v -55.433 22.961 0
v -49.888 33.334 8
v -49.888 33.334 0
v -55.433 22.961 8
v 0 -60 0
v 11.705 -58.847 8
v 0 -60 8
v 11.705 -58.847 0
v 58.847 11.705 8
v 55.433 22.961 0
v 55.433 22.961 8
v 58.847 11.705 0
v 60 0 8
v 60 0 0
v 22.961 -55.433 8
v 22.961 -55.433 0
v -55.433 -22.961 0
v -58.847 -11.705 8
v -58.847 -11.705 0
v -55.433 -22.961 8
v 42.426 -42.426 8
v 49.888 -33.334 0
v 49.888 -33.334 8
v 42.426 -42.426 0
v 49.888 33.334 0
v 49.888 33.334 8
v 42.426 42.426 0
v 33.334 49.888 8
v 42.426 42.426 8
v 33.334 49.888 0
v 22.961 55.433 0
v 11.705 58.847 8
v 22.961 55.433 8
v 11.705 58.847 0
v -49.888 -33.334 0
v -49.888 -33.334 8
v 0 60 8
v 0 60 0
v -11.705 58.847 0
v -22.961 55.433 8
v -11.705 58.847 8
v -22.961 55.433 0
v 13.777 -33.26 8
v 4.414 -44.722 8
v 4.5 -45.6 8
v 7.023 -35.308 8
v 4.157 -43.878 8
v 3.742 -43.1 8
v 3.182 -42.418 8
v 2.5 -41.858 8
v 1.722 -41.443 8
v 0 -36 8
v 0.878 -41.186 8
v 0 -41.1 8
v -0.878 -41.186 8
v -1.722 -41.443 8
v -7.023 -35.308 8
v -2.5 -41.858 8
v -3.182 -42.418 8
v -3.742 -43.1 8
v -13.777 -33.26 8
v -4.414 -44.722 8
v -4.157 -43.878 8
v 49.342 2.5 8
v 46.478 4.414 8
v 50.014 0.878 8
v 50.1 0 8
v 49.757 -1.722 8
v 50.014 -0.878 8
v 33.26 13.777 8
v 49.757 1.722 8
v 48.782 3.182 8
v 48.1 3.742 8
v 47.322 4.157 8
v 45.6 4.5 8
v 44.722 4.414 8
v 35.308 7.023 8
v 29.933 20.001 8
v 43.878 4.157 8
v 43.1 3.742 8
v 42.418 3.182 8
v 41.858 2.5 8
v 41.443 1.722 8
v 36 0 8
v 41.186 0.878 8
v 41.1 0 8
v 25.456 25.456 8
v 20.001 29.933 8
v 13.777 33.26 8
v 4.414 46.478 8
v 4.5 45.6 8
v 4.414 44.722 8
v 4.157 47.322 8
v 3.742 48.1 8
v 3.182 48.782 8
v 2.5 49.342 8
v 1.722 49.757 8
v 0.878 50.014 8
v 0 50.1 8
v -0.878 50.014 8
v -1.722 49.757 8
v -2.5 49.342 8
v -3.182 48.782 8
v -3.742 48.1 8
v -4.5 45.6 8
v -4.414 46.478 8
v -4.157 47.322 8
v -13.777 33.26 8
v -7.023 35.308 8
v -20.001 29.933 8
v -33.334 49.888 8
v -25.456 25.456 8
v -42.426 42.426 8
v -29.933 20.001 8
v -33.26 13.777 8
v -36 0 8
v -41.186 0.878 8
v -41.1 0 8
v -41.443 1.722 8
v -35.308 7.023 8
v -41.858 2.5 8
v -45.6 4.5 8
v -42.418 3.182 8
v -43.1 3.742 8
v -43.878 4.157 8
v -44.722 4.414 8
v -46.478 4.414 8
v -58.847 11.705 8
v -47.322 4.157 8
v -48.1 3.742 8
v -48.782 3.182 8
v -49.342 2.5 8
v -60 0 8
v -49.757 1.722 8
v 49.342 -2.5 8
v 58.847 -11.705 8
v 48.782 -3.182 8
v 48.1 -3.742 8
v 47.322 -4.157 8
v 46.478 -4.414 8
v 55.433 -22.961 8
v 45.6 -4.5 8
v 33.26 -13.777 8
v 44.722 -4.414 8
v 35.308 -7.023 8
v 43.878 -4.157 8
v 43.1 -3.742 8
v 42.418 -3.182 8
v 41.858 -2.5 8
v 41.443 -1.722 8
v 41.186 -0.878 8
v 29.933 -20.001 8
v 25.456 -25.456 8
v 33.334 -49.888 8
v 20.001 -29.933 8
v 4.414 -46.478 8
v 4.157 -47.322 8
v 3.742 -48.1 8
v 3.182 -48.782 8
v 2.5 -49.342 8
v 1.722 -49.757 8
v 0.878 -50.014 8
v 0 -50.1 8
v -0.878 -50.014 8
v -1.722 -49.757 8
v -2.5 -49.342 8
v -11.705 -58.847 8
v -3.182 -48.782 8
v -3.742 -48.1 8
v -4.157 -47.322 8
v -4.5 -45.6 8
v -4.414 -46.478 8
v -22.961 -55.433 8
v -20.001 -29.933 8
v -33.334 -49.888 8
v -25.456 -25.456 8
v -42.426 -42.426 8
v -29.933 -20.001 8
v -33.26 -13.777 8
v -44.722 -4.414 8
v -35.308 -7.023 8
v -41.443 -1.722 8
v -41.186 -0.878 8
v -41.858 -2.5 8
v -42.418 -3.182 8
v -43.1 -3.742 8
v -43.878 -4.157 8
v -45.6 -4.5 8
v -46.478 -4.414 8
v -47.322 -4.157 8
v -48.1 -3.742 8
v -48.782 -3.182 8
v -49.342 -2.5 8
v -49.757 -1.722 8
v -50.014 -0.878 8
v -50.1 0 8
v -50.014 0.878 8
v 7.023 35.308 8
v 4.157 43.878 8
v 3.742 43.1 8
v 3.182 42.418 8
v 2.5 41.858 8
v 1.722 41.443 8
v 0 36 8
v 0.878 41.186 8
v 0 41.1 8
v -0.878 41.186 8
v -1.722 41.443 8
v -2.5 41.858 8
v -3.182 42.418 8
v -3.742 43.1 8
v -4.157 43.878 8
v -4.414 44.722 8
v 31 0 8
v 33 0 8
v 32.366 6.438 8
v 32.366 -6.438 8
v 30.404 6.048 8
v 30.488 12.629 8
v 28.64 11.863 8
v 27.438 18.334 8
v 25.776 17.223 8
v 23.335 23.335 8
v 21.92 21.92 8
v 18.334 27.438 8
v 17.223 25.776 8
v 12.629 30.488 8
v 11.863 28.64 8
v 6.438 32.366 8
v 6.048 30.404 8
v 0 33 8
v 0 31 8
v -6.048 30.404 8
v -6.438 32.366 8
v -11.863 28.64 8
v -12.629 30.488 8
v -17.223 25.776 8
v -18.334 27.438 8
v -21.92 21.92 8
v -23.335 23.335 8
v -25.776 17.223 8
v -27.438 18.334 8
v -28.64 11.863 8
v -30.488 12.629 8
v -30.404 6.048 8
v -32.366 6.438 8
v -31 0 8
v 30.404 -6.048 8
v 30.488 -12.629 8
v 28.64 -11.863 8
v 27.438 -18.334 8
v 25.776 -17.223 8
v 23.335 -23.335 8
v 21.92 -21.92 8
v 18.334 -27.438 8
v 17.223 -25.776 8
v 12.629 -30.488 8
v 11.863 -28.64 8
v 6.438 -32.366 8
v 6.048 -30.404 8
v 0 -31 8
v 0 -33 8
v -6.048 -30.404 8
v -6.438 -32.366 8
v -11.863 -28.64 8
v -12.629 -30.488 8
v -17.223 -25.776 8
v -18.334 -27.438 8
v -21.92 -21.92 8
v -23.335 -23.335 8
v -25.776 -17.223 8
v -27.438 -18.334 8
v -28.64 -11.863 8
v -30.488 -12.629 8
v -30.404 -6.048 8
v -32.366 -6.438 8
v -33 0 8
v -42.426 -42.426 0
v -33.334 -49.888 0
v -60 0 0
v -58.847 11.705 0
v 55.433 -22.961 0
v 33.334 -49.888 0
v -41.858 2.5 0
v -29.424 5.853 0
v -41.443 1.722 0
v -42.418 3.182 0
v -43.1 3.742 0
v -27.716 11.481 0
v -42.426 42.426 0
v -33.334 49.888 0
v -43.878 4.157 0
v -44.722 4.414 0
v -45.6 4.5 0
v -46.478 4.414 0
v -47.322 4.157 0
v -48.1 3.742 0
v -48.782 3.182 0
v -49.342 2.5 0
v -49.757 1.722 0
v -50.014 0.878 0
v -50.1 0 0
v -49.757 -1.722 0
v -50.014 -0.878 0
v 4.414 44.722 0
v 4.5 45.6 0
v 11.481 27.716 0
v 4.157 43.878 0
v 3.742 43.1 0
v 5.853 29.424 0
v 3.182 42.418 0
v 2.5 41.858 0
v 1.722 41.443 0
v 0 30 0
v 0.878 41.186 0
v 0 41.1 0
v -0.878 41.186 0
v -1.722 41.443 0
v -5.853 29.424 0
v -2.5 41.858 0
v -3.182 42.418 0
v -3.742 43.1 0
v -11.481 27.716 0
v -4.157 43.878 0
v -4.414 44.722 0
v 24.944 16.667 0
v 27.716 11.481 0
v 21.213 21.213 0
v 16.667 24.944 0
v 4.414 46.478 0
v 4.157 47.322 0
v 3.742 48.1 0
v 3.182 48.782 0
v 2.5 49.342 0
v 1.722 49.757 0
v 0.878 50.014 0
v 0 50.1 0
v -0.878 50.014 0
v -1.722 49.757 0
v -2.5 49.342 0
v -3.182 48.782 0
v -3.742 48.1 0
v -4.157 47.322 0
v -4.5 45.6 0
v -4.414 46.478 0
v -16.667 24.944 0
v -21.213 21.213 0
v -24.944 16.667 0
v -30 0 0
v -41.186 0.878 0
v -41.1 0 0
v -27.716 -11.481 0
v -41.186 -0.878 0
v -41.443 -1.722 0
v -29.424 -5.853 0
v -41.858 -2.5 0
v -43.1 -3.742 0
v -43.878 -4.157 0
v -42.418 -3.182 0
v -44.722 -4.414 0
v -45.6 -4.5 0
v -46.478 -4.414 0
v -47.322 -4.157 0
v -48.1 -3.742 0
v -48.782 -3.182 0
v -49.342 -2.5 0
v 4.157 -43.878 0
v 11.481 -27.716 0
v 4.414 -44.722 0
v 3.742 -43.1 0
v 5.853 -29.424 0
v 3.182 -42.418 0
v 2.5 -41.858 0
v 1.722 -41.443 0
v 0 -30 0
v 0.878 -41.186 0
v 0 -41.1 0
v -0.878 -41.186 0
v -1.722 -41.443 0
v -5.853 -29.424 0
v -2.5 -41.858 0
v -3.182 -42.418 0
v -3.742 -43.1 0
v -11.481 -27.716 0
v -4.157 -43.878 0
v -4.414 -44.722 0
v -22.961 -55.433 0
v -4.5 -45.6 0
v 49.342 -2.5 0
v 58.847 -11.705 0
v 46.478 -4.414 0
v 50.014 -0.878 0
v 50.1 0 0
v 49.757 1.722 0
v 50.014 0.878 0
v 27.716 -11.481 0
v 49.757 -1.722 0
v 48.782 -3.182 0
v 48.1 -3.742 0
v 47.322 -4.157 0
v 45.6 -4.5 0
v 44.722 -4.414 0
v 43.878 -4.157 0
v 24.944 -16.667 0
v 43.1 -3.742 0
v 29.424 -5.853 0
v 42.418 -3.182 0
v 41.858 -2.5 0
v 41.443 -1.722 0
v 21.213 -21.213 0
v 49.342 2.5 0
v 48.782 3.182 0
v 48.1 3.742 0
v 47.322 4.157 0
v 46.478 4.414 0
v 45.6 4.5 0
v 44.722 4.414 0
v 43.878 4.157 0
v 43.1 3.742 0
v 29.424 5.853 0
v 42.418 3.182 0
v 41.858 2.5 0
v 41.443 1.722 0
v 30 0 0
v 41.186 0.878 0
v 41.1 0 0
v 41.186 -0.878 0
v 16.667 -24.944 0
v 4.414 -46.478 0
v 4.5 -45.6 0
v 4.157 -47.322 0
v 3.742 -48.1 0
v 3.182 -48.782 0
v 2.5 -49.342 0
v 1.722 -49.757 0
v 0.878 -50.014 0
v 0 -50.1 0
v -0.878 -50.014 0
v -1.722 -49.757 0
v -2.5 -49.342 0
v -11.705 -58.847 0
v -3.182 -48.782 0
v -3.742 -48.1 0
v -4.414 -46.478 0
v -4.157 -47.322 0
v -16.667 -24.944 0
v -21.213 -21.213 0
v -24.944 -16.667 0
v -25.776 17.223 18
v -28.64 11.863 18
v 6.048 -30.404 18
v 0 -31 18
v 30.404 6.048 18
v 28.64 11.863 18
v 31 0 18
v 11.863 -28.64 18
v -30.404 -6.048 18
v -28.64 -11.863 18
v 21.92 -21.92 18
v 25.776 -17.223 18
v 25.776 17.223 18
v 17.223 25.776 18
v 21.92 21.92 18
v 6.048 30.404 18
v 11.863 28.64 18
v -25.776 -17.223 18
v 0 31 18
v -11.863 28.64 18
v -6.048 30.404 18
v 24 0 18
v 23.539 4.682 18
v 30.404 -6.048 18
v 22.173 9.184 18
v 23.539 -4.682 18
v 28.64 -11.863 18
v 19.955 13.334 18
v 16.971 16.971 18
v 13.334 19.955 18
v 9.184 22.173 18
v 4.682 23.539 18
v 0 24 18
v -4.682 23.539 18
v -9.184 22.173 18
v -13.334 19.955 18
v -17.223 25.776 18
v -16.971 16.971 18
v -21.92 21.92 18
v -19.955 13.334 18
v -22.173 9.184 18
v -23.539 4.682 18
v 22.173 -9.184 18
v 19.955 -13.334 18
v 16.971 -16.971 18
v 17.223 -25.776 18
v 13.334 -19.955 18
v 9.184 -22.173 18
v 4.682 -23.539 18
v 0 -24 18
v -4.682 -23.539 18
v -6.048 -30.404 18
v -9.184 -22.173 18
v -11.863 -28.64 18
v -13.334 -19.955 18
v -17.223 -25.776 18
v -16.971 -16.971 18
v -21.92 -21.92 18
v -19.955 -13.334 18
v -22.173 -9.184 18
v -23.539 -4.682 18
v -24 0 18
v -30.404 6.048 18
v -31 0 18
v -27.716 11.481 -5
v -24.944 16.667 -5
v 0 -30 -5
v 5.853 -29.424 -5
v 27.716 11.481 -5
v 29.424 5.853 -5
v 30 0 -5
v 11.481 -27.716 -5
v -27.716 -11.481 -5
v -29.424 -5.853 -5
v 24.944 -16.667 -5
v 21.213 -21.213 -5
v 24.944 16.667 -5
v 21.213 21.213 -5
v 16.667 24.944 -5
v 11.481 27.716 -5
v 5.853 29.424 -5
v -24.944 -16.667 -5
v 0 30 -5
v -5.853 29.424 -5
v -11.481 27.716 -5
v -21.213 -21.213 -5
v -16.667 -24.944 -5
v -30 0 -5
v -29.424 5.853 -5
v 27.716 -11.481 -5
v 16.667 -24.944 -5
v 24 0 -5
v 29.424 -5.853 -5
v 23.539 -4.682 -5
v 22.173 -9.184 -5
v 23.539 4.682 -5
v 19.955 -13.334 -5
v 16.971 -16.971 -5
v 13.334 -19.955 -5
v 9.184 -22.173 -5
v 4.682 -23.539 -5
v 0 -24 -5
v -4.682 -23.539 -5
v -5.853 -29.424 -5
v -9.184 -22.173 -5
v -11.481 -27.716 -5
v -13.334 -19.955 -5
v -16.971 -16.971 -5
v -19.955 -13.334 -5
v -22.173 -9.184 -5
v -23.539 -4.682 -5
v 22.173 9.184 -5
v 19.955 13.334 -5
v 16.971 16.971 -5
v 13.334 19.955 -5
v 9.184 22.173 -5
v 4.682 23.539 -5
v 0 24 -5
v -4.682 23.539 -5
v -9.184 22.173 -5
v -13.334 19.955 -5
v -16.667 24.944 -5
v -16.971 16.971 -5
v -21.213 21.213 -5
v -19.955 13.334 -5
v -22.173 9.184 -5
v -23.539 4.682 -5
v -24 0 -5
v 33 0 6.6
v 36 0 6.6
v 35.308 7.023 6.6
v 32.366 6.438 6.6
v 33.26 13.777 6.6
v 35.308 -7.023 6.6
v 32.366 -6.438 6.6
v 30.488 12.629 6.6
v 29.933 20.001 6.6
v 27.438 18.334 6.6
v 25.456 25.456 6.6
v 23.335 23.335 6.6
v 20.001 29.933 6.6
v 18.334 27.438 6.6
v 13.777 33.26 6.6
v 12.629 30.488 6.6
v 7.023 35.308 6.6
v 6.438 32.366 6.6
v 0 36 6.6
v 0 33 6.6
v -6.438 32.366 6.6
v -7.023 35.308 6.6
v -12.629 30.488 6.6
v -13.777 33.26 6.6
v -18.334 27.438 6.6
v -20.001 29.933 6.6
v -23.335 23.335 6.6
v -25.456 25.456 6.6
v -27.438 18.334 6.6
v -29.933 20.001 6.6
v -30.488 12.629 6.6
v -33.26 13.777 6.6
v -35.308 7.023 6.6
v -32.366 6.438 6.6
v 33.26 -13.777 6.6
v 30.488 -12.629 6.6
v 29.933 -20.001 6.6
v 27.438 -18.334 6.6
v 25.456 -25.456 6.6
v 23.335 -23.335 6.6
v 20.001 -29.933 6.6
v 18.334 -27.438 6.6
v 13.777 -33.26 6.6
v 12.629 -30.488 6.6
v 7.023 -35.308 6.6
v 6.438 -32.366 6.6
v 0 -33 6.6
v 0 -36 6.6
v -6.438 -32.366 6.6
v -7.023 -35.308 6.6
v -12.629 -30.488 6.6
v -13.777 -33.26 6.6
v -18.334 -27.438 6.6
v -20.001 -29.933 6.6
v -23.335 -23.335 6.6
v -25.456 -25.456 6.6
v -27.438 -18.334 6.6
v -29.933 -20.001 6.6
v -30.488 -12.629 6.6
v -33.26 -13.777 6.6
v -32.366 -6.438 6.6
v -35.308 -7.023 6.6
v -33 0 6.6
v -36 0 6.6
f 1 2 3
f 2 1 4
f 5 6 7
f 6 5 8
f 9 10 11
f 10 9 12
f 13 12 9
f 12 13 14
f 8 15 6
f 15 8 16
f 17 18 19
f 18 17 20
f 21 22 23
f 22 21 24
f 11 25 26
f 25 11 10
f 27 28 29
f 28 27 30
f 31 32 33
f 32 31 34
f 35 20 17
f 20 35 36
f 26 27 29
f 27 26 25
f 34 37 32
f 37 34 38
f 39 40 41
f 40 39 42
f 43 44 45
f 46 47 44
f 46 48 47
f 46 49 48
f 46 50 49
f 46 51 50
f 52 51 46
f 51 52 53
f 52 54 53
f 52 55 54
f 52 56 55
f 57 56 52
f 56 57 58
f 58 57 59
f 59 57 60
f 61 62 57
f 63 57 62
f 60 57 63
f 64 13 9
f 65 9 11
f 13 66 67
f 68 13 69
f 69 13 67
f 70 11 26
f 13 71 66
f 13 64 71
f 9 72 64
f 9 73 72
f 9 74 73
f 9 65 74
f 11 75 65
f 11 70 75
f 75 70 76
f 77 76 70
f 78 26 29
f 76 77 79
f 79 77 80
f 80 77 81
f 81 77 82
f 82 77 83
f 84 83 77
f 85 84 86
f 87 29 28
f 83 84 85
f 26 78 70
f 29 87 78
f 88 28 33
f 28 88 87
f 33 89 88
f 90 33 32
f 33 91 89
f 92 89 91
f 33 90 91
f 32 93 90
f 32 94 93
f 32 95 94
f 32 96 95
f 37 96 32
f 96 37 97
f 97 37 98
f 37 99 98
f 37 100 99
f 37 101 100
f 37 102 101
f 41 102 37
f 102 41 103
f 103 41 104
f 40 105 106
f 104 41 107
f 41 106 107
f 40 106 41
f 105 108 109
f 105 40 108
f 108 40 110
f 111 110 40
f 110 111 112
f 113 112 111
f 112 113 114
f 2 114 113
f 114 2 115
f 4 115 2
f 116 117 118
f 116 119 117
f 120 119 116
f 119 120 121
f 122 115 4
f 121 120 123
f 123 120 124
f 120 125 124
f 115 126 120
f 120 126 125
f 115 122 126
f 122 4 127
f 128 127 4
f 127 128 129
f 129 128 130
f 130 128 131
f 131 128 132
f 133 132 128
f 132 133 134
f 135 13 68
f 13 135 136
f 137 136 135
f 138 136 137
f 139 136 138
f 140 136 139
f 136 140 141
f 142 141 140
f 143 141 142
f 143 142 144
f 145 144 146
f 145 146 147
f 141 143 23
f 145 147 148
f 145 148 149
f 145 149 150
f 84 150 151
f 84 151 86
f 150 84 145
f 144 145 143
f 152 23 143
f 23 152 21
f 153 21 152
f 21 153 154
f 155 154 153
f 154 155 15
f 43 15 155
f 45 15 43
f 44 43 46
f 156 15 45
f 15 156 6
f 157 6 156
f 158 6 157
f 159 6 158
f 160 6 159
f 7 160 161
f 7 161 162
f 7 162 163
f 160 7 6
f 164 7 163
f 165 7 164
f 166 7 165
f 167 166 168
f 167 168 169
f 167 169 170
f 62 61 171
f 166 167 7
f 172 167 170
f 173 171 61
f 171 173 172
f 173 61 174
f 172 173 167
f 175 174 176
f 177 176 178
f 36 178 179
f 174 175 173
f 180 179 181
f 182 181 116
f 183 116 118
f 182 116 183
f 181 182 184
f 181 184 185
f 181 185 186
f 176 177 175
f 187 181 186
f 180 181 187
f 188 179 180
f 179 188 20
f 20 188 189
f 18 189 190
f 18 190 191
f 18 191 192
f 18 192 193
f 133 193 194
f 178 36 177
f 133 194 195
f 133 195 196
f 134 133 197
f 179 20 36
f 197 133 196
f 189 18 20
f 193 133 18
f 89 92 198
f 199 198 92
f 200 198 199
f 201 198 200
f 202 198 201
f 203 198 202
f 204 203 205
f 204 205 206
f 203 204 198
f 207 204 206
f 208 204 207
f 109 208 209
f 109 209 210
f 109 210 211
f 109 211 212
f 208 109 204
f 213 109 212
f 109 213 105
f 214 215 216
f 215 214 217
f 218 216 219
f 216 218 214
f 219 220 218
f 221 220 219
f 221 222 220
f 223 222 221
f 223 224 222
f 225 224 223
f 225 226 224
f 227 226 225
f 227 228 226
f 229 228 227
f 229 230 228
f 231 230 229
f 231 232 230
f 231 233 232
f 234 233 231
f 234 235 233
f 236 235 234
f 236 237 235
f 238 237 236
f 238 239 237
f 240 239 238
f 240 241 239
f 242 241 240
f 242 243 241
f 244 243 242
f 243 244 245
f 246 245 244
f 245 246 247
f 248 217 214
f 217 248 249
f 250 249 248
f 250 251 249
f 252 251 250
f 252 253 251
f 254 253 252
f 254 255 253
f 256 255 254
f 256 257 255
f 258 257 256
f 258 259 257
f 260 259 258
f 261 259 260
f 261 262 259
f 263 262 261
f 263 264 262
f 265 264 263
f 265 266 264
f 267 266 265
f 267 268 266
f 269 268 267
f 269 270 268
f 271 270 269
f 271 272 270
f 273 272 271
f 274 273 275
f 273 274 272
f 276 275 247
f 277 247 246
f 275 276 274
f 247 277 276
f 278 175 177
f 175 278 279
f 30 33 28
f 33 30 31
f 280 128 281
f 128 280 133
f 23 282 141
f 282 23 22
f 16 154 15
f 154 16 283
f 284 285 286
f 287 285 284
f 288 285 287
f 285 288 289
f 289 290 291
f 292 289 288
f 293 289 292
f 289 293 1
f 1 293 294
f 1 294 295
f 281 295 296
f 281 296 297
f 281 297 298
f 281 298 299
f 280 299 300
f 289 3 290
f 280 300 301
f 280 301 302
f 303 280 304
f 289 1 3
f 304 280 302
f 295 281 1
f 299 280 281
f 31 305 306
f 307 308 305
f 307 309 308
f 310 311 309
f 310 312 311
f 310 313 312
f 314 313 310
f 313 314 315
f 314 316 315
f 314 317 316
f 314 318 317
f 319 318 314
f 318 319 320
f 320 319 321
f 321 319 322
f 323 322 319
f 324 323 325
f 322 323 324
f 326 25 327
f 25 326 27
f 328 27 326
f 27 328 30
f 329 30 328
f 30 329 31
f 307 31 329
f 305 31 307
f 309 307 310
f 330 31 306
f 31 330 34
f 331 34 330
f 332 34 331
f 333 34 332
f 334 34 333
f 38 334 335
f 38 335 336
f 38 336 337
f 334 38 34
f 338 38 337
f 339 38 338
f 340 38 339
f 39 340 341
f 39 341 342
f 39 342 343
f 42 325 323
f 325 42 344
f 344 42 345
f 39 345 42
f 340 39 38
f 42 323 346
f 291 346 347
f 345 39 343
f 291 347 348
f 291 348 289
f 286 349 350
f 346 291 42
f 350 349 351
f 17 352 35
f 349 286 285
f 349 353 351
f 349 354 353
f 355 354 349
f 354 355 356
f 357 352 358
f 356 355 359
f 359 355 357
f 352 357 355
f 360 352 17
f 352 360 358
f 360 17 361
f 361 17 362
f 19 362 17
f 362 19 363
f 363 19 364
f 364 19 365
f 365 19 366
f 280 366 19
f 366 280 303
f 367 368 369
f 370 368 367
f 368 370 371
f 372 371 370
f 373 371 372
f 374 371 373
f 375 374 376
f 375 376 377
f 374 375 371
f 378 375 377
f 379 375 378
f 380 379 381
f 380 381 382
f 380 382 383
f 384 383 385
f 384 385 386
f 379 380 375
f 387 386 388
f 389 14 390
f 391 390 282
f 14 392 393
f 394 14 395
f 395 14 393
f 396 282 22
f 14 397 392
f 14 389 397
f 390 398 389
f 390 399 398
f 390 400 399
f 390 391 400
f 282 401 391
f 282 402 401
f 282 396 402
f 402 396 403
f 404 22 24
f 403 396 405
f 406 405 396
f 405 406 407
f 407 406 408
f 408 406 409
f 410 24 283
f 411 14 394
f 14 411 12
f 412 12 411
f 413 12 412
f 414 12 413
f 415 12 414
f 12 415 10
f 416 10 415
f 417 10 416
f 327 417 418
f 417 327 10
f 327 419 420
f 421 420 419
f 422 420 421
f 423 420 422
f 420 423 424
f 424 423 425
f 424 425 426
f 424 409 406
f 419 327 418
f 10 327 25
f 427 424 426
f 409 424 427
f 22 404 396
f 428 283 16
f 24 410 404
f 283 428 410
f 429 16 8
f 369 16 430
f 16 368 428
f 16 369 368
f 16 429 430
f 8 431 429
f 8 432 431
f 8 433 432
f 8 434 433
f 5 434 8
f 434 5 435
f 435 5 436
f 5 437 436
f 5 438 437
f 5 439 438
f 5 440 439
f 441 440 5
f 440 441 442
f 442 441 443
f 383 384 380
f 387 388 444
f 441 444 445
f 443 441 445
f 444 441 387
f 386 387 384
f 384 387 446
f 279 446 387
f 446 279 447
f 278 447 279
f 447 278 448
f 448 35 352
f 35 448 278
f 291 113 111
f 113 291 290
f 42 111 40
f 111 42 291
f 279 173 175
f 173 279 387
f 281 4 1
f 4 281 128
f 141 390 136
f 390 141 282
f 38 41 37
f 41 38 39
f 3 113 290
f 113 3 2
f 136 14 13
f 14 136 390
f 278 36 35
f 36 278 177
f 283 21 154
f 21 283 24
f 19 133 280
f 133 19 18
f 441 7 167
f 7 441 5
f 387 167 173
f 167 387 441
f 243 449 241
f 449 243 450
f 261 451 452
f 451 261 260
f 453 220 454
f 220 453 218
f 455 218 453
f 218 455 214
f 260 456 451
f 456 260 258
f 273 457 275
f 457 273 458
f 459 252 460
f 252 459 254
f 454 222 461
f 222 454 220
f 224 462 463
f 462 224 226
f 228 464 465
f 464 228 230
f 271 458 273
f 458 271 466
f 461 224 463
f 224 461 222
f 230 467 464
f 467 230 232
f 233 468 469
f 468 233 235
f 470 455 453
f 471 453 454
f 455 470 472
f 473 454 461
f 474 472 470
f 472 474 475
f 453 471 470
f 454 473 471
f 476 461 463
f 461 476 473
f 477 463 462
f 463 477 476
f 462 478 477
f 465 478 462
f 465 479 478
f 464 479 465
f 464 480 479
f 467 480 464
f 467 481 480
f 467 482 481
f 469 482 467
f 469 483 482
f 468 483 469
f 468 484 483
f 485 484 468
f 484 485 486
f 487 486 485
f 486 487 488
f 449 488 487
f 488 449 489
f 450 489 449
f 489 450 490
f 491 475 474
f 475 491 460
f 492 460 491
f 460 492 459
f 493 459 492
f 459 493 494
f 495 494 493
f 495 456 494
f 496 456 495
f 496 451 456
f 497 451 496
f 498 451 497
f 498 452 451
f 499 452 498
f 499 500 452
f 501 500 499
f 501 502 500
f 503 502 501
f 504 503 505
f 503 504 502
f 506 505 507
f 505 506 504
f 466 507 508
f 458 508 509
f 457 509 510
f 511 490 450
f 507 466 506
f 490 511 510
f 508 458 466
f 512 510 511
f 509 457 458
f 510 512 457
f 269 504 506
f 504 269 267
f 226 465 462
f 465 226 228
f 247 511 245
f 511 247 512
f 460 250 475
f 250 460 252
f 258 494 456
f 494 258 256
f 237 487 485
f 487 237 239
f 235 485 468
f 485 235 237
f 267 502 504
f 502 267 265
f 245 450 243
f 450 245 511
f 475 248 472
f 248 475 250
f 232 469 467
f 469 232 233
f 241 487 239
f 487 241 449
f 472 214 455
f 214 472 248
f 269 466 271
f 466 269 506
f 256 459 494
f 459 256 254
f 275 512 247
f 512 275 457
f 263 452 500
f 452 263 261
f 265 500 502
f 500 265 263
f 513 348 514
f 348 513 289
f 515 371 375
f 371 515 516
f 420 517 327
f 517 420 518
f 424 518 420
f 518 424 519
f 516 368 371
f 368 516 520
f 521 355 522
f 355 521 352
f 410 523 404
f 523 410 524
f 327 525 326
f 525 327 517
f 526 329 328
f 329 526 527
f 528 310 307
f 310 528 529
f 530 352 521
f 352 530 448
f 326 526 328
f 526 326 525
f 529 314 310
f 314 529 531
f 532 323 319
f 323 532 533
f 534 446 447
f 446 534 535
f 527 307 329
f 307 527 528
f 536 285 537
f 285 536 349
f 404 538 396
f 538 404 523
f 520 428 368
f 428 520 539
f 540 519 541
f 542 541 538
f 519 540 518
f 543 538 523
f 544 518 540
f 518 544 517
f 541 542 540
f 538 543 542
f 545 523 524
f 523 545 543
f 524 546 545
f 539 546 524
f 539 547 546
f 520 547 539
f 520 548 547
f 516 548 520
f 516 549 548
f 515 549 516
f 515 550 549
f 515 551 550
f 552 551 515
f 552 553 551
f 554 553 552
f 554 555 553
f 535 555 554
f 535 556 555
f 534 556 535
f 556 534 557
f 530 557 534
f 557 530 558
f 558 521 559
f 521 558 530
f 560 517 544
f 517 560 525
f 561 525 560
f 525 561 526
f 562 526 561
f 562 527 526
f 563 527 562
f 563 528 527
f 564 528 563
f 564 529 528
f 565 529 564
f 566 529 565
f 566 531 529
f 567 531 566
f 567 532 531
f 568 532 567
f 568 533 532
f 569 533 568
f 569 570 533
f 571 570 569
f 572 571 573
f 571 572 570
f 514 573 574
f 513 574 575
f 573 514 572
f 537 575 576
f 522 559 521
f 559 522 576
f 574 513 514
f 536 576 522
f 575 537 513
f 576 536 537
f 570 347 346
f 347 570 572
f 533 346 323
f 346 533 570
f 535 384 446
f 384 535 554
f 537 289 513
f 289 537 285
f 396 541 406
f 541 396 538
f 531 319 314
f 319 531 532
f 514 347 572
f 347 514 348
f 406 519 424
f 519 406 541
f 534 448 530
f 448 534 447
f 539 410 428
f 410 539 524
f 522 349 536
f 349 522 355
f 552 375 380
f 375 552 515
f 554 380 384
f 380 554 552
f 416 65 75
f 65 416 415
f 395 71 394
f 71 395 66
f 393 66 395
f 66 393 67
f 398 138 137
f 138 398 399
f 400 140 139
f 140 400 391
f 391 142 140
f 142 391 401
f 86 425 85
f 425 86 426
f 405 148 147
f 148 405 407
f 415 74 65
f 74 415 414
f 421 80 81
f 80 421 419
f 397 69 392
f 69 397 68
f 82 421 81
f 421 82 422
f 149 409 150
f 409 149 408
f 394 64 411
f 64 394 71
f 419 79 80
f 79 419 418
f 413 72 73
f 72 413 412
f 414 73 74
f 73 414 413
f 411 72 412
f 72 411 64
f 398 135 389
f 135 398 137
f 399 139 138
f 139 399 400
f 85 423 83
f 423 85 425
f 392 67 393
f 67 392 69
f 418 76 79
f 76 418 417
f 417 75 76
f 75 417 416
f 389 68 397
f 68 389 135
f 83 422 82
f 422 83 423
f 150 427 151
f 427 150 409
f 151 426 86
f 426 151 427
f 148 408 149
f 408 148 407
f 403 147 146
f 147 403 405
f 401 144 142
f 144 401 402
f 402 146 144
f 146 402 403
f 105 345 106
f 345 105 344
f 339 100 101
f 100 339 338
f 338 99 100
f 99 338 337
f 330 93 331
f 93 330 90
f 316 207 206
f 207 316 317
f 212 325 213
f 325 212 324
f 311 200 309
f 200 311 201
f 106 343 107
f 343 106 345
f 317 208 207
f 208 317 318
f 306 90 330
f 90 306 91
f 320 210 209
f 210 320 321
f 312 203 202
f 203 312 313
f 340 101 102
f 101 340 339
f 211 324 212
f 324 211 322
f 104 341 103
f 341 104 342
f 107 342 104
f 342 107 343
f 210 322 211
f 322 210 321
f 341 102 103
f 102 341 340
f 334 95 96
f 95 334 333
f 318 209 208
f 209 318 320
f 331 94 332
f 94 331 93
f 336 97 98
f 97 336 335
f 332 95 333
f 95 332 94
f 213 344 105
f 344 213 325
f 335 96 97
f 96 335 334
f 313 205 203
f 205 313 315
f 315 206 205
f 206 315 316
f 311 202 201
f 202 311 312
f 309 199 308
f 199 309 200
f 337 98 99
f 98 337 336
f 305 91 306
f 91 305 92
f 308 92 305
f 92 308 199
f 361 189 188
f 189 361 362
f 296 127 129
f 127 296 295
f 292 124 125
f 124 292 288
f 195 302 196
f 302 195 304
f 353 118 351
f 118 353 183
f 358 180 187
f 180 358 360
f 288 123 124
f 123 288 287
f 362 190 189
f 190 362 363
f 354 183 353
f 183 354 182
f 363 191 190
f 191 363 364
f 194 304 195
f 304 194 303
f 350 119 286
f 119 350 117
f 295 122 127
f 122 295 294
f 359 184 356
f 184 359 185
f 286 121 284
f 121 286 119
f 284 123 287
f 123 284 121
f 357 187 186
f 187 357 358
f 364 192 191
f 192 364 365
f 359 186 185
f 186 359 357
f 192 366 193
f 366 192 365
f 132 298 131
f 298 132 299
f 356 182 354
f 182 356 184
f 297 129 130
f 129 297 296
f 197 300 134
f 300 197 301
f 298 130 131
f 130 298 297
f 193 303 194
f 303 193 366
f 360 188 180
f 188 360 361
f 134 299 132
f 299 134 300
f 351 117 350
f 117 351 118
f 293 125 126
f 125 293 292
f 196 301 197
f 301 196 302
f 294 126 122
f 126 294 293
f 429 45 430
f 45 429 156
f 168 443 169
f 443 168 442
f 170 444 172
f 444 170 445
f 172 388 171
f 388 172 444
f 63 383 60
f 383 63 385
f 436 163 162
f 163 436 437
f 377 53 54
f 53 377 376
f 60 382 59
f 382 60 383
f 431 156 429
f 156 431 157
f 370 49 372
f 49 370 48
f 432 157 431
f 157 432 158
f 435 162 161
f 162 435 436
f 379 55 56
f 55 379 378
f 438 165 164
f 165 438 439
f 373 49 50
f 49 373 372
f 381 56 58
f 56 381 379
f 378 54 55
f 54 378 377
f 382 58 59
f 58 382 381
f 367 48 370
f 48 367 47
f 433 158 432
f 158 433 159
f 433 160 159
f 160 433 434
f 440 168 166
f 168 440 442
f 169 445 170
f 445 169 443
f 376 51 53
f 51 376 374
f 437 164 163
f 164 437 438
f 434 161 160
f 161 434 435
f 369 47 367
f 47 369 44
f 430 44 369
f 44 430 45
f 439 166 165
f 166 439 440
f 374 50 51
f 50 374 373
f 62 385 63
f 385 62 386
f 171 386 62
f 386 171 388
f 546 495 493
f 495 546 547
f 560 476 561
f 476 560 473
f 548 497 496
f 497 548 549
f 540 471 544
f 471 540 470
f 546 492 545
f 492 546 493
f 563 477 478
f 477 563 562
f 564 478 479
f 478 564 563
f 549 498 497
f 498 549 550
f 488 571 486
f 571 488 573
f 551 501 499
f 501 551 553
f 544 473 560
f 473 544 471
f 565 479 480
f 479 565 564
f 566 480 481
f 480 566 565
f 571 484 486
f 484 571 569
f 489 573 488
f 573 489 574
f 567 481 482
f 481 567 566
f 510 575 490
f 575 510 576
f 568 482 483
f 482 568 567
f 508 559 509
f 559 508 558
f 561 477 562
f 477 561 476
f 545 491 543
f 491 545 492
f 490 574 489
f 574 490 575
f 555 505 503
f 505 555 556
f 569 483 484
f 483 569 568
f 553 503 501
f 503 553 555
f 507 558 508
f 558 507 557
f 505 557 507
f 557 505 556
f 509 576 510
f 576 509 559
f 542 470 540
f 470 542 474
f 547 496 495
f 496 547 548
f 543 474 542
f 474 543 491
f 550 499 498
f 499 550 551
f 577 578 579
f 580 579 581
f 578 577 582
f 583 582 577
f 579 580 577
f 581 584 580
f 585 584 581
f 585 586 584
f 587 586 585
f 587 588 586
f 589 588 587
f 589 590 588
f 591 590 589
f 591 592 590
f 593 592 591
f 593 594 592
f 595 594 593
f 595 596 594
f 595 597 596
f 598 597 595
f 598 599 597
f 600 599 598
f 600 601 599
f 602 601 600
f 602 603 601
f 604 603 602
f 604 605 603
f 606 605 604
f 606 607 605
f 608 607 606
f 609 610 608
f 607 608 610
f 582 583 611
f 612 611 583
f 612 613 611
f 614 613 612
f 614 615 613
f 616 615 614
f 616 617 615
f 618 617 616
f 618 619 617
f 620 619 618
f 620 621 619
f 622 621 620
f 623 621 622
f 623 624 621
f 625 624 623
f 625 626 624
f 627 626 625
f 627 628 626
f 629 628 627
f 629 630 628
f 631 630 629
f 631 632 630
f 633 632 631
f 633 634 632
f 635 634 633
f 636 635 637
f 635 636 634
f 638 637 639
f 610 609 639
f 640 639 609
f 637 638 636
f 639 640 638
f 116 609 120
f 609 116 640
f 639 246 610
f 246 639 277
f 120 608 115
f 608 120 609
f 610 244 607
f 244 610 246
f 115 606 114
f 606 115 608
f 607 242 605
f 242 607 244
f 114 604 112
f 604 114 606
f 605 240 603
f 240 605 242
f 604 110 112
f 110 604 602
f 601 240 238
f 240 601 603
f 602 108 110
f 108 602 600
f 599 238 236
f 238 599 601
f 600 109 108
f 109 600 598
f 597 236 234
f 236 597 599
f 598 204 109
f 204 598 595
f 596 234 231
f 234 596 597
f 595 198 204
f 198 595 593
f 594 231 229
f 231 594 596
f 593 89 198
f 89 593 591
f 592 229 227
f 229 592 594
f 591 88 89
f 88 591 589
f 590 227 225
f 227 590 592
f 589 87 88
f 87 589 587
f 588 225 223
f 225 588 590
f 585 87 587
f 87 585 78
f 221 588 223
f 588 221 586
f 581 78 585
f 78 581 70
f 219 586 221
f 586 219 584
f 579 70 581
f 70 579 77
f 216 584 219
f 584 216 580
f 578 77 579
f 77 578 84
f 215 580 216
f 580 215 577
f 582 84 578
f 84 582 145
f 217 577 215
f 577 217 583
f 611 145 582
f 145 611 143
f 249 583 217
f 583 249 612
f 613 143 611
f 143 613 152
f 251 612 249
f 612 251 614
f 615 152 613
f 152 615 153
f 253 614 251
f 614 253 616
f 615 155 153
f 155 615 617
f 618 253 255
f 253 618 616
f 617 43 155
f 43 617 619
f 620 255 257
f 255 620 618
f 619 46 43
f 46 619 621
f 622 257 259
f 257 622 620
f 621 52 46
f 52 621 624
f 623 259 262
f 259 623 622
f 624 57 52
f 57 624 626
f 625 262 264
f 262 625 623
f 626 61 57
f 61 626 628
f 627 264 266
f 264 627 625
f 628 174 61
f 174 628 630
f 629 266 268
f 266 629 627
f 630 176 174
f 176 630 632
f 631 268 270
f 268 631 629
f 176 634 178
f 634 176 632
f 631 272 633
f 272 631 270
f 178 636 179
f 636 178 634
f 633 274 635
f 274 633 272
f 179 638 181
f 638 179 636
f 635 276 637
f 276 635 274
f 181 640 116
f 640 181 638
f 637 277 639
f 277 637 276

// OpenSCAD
$fn = 32;

// ----------------------------------------------------------------------
// Bolt-circle flange: 120 mm outside, 4 bolt holes, bore 48 mm
// ----------------------------------------------------------------------

// --- parameters (mm) ---
flange_d = 120;           // flange outside diameter
flange_t = 8;             // flange thickness
bolts = 4;                // number of bolt holes
bolt_d = 9;               // bolt clearance
bolt_r = 45.6;            // bolt circle radius
bore_d = 48;              // centre bore
hub_d = 62;               // raised hub diameter
hub_h = 10;               // raised hub height
spigot_d = 60;            // spigot diameter
spigot_h = 6;             // spigot height below the flange
sink = 1;                 // overlap into the flange
groove_w = 3;             // gasket groove width
groove_d = 1.4;           // gasket groove depth
groove_r = 33;            // groove radius
groove_z = 6.6;           // groove floor depth from the face

module body() {
  cylinder(h = flange_t, d = flange_d);
  /* raised hub, sunk 1 mm into the flange */
  translate([0, 0, flange_t - 1]) cylinder(h = hub_h + 1, d = hub_d);
  /* spigot on the back face, sunk into the flange */
  translate([0, 0, -spigot_h + sink]) cylinder(h = spigot_h, d = spigot_d);
}

difference() {
  body();
  /* bolt circle */
  for (i = [0 : bolts - 1]) rotate([0, 0, i * 360 / bolts]) translate([bolt_r, 0, -spigot_h - 1]) cylinder(h = flange_t + hub_h + spigot_h + 3, d = bolt_d);
  translate([0, 0, -spigot_h - 1]) cylinder(h = flange_t + hub_h + spigot_h + 3, d = bore_d);
  /* gasket groove on the front face */
  rotate_extrude() translate([groove_r, groove_z]) square([groove_w, groove_d + 1]);
}
